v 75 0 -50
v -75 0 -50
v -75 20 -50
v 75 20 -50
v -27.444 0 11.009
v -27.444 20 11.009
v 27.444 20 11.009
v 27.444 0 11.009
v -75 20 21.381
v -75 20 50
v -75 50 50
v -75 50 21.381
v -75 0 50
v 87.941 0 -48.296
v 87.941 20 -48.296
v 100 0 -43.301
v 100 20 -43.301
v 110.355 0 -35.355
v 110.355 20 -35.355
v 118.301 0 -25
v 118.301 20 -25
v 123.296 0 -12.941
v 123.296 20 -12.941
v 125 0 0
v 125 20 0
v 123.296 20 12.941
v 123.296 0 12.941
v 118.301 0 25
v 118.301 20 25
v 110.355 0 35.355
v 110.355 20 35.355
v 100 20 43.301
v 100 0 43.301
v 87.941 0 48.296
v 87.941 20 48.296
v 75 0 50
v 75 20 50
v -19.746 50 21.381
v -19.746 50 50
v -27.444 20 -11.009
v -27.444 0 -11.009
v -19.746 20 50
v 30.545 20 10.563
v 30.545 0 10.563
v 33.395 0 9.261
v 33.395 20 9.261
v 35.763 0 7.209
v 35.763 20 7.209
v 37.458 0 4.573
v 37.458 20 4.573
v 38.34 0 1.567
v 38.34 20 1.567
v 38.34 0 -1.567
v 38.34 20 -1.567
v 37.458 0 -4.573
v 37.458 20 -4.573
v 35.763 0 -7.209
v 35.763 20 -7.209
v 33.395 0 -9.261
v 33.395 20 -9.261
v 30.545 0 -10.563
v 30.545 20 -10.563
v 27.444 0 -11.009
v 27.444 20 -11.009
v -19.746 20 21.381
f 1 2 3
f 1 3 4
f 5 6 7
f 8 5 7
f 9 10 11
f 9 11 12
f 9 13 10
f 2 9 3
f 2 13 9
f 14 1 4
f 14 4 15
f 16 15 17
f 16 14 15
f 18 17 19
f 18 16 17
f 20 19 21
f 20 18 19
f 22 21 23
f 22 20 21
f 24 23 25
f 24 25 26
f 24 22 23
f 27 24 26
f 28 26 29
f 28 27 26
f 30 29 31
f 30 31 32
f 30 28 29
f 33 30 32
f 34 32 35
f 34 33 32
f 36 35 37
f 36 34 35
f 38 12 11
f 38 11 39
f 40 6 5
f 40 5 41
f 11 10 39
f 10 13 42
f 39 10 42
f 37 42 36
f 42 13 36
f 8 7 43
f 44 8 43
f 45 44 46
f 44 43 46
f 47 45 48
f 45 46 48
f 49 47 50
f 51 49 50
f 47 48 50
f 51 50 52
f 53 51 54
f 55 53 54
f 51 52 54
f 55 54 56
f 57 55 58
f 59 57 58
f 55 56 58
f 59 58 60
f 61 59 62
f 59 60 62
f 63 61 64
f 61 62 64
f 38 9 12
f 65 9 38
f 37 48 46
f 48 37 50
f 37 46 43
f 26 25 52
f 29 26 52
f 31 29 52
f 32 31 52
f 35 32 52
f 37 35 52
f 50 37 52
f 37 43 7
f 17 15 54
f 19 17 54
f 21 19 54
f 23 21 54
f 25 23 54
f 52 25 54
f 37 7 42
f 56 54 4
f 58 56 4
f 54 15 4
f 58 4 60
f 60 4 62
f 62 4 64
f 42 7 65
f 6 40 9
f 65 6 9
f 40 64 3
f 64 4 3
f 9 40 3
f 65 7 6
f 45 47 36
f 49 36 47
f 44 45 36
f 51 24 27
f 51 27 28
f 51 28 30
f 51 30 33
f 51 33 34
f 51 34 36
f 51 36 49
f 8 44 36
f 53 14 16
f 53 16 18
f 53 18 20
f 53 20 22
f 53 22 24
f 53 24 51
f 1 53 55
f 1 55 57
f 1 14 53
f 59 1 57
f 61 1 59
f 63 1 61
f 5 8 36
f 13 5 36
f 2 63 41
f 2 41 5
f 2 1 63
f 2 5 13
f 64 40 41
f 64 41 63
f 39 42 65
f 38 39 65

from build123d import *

# Parameters (mm, degrees)
BOSS_EXTRUDE1_DEPTH = 20
SKETCH2_W           = 55.254397281
SKETCH2_H           = 28.618836095
BOSS_EXTRUDE5_DEPTH = 30
SKETCH3_R           = 11.008857327
SKETCH3_W           = 54.887017246
SKETCH3_H           = 22.017714654
CUT_EXTRUDE1_DEPTH  = 30


with BuildPart() as part:
    # Sketch1 → Boss-Extrude1 (new body)
    with BuildSketch(Plane(origin=(0, 0, 0), x_dir=(1, 0, 0), z_dir=(0, 1, 0))):
        with BuildLine():
            Line((-75, 50), (75, 50))
            ThreePointArc((75, 50), (125, 0), (75, -50))
            Line((75, -50), (-75, -50))
            Line((-75, -50), (-75, 50))
        make_face()
    extrude(amount=BOSS_EXTRUDE1_DEPTH)

    # Sketch2 → Boss-Extrude5 (add)
    with BuildSketch(Plane(origin=(0, 20, 0), x_dir=(1, 0, 0), z_dir=(0, 1, 0))):
        with Locations((-47.37280136, -35.690581952)):
            Rectangle(SKETCH2_W, SKETCH2_H)
    extrude(amount=BOSS_EXTRUDE5_DEPTH)

    # Sketch3 → Cut-Extrude1 (cut)
    with BuildSketch(Plane(origin=(0, 20, 0), x_dir=(1, 0, 0), z_dir=(0, 1, 0))):
        with Locations((27.443508623, 0)):
            Circle(SKETCH3_R)
        Rectangle(SKETCH3_W, SKETCH3_H)
    extrude(amount=-CUT_EXTRUDE1_DEPTH, mode=Mode.SUBTRACT)


solid = part.part
